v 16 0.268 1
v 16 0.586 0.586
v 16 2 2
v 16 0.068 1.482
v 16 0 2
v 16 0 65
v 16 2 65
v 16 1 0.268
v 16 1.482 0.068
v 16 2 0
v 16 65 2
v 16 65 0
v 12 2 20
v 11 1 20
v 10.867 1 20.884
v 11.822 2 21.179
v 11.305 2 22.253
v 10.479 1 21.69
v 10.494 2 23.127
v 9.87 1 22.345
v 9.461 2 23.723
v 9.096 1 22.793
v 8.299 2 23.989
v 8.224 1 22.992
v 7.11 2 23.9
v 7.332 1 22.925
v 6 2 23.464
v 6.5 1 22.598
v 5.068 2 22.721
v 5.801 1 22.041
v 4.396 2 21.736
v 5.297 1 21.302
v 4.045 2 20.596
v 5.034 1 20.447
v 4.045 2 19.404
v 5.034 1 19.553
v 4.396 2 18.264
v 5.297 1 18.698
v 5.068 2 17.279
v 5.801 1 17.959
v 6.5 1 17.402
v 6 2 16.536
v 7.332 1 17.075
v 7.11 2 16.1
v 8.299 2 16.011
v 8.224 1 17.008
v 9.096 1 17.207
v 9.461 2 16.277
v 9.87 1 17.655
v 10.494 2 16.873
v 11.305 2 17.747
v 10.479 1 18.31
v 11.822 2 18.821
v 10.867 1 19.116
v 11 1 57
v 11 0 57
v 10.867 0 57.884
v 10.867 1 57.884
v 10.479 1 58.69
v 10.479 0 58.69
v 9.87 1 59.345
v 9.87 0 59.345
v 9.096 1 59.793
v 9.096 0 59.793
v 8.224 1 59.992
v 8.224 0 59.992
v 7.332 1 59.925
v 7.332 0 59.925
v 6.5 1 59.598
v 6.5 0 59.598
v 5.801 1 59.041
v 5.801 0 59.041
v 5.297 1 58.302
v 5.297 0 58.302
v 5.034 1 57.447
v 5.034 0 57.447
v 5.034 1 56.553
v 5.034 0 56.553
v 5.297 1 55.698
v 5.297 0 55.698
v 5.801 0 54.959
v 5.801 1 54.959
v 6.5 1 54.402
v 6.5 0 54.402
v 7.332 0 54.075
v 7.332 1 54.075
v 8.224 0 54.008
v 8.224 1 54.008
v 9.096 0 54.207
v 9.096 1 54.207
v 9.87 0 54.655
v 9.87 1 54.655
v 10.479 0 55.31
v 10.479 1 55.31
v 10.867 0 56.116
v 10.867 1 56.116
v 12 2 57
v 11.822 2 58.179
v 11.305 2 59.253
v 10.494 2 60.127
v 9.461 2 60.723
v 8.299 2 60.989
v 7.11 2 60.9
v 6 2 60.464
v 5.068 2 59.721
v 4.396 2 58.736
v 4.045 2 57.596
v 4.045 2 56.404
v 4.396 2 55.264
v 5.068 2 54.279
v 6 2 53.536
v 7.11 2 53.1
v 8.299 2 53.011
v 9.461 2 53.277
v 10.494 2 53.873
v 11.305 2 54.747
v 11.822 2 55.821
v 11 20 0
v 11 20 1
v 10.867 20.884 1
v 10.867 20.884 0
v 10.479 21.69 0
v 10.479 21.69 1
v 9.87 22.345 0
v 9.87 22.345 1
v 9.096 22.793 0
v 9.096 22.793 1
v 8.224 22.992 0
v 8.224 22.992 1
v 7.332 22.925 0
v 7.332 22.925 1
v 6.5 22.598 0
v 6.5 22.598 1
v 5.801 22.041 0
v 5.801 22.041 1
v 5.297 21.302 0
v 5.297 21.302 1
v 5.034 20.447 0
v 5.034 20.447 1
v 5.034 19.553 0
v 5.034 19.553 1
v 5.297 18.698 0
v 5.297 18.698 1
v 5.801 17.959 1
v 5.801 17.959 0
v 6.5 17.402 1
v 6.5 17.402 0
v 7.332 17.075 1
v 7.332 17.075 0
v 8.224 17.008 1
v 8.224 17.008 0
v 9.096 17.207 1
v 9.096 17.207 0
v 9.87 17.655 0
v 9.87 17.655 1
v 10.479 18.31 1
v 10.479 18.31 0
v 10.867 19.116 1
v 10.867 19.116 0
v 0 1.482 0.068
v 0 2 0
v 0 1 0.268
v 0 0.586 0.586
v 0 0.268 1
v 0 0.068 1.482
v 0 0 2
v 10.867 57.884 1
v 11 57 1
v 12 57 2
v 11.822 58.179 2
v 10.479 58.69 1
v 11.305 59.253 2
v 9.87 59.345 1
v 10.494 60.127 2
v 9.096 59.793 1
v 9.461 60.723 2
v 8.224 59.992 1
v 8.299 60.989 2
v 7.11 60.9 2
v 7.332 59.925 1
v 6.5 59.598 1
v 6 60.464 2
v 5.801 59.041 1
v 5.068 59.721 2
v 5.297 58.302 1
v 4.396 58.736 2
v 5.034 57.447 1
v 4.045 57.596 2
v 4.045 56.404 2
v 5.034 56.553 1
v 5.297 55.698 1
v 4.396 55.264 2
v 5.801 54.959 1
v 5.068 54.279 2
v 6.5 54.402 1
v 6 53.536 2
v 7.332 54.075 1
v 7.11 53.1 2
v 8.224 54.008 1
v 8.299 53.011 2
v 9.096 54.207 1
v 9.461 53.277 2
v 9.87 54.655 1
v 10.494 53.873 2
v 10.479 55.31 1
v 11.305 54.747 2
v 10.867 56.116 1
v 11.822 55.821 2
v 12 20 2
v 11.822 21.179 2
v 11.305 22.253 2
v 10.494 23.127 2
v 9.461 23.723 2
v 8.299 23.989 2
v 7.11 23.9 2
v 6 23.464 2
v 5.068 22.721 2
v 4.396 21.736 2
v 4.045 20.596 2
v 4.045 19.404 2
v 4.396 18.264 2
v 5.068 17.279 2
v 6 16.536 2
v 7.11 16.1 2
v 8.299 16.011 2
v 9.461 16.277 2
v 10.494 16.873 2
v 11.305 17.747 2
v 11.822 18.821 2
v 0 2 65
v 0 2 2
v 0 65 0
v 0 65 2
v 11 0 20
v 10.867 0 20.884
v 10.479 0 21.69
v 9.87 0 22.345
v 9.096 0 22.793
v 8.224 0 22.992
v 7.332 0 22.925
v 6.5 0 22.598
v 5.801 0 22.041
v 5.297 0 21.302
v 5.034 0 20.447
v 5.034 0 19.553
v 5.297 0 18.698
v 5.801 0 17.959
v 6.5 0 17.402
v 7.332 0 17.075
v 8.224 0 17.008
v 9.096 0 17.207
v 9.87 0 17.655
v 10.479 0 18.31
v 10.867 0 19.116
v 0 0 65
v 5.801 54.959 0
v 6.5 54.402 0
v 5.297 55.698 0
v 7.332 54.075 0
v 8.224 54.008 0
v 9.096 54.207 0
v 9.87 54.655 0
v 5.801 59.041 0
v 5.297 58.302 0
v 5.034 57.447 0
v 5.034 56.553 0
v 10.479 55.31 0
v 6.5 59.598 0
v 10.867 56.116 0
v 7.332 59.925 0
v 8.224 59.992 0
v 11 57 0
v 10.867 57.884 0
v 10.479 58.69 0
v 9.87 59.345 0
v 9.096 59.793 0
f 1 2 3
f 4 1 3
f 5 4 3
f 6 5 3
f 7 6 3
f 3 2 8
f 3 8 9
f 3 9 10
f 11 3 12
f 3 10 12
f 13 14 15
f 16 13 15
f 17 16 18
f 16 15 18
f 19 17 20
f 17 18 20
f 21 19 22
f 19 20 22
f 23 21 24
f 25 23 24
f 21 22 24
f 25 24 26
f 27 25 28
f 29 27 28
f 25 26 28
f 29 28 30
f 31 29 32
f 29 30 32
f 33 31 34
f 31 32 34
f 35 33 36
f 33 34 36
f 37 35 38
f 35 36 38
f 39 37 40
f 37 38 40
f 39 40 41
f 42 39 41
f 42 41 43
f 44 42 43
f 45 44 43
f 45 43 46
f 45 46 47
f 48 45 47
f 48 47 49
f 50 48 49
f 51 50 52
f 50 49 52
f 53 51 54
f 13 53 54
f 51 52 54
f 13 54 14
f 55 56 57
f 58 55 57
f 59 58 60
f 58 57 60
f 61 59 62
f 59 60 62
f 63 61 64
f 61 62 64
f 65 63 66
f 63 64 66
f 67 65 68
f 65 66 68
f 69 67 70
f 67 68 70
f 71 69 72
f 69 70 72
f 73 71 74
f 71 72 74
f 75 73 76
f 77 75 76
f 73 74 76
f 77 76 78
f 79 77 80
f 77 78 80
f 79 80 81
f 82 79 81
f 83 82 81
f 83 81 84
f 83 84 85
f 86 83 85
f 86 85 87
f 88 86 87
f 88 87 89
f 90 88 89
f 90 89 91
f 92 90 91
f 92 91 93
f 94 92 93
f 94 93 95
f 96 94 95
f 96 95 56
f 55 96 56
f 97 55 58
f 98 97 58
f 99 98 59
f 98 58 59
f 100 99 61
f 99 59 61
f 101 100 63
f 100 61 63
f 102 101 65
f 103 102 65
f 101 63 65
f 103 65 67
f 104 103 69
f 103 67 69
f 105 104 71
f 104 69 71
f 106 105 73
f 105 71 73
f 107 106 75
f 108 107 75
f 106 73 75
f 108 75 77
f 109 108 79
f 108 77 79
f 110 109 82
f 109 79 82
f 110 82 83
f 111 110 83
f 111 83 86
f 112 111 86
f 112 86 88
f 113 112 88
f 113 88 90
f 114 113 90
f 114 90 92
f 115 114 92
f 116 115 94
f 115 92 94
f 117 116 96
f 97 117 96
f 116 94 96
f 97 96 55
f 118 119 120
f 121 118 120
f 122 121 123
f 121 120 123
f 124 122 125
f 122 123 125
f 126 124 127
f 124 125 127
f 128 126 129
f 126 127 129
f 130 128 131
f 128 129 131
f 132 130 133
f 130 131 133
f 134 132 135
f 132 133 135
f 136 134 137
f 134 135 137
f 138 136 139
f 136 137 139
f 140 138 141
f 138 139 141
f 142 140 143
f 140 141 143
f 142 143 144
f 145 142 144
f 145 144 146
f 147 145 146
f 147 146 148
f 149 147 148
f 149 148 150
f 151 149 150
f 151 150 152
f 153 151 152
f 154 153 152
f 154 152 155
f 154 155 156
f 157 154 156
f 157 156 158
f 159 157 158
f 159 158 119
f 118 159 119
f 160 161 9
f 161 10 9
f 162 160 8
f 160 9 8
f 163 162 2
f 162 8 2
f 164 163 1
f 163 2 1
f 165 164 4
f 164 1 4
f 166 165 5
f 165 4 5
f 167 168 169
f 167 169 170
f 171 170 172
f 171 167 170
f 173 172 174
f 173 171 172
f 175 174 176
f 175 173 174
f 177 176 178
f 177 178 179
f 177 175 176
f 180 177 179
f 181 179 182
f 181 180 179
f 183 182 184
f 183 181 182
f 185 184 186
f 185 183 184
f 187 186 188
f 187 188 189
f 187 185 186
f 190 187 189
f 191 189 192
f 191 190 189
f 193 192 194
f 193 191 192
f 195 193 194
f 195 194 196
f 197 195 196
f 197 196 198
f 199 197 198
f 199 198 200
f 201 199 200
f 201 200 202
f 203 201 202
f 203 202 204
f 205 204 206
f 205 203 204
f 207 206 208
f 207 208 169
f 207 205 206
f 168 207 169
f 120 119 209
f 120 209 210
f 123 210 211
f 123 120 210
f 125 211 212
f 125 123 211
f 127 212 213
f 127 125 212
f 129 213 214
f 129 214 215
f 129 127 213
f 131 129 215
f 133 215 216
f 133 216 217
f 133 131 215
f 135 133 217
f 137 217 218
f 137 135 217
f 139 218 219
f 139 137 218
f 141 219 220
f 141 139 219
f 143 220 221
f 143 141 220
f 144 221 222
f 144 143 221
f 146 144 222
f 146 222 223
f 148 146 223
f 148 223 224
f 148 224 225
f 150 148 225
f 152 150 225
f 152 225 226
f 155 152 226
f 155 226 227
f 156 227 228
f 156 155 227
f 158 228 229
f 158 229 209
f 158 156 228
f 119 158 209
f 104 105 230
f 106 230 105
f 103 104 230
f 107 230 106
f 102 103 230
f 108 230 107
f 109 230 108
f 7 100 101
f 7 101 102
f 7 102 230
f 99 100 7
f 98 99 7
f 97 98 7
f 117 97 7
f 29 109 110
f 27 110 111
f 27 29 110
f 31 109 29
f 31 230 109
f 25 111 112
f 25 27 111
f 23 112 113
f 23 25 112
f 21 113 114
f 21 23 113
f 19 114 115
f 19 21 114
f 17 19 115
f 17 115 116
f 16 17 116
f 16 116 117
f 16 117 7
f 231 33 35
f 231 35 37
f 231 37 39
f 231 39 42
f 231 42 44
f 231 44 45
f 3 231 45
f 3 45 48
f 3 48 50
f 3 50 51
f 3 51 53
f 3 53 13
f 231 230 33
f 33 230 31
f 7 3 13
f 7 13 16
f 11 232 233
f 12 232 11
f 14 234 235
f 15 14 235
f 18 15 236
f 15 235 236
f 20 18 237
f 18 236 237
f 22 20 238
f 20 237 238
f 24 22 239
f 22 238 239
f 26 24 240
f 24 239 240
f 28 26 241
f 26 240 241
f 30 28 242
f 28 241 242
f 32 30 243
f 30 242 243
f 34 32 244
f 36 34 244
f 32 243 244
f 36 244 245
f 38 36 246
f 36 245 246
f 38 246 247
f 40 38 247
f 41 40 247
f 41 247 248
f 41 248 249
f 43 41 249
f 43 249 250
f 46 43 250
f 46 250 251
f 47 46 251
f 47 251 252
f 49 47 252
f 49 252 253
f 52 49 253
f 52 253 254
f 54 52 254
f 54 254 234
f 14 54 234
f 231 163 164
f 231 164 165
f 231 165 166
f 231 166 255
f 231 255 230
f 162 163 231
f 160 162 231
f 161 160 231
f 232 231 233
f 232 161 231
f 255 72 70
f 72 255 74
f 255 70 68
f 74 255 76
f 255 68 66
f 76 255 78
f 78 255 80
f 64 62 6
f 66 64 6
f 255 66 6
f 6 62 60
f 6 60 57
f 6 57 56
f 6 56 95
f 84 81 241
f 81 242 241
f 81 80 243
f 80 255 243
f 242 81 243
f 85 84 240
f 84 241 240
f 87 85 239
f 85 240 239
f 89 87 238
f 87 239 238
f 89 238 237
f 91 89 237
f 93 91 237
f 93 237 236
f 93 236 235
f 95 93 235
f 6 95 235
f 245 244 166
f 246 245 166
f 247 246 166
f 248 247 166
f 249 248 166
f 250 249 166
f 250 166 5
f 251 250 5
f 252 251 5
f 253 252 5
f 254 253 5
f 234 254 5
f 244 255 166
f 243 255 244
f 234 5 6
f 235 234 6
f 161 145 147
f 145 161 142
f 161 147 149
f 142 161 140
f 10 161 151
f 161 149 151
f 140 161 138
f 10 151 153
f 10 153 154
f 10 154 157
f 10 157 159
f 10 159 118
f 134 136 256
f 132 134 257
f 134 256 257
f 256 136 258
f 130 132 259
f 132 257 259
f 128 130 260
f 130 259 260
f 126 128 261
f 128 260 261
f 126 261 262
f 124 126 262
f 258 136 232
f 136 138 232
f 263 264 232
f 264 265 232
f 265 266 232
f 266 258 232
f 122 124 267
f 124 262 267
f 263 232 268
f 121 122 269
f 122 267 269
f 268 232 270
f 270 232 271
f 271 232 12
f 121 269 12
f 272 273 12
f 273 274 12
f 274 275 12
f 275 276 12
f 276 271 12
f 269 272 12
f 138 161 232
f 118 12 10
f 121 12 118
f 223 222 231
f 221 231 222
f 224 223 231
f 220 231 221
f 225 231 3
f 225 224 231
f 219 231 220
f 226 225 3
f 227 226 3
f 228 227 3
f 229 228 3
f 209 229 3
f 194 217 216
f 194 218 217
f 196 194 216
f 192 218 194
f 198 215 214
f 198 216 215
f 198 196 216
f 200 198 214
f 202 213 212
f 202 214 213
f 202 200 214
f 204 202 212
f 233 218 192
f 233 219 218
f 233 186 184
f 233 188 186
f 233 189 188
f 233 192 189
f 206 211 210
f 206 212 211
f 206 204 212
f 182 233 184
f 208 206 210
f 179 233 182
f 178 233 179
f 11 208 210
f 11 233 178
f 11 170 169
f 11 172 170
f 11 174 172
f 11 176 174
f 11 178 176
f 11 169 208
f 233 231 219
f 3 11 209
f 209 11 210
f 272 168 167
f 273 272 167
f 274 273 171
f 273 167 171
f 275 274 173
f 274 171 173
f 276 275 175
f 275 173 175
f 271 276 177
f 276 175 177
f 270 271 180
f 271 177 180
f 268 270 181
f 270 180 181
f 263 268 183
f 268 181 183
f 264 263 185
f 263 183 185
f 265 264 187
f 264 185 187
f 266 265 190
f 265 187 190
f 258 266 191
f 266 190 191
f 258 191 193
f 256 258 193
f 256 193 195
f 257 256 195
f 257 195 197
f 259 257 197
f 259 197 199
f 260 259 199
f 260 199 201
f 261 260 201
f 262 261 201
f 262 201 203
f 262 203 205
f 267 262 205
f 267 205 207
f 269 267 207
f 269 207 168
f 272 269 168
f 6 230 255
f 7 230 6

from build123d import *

# Parameters (mm, degrees)
F0_W     = 16
F0_H     = 65
F1_DEPTH = 2
F2_W     = 16
F2_H     = 2
F3_DEPTH = 63
F4_R     = 3
F5_DEPTH = 2.001
F6_R     = 3
F7_DEPTH = 65.001
F8_SIZE  = 1
F9_R     = 2


with BuildPart() as f1:
    # F0 (on Top) → F1 (new body)
    with BuildSketch(Plane.XY):
        with Locations((8, 32.5)):
            Rectangle(F0_W, F0_H)
    extrude(amount=F1_DEPTH)

    # F2 (on face) → F3 (join)
    with BuildSketch(Plane.XY.offset(2)):
        with Locations((8, 1)):
            Rectangle(F2_W, F2_H)
    extrude(amount=F3_DEPTH)

    # F4 (on face) → F5 (cut, through all)
    with BuildSketch(Plane.XY.offset(2)):
        with Locations((8, 57)):
            Circle(F4_R)
        with Locations((8, 20)):
            Circle(F4_R)
    extrude(amount=-F5_DEPTH, mode=Mode.SUBTRACT)

    # F6 (on face) → F7 (cut, through all)
    with BuildSketch(Plane.XZ):
        with Locations((8, 57)):
            Circle(F6_R)
        with Locations((8, 20)):
            Circle(F6_R)
    extrude(amount=-F7_DEPTH, mode=Mode.SUBTRACT)

    # F8
    f8_edges = [f1.edges().sort_by_distance(p)[0] for p in [
        (5, 2, 57),
        (5, 2, 20),
        (5, 20, 2),
        (5, 57, 2),
    ]]
    chamfer(f8_edges, length=F8_SIZE)

    # F9
    f9_edges = [f1.edges().sort_by_distance(p)[0] for p in [
        (8, 0, 0),
    ]]
    fillet(f9_edges, radius=F9_R)


solid = f1.part
